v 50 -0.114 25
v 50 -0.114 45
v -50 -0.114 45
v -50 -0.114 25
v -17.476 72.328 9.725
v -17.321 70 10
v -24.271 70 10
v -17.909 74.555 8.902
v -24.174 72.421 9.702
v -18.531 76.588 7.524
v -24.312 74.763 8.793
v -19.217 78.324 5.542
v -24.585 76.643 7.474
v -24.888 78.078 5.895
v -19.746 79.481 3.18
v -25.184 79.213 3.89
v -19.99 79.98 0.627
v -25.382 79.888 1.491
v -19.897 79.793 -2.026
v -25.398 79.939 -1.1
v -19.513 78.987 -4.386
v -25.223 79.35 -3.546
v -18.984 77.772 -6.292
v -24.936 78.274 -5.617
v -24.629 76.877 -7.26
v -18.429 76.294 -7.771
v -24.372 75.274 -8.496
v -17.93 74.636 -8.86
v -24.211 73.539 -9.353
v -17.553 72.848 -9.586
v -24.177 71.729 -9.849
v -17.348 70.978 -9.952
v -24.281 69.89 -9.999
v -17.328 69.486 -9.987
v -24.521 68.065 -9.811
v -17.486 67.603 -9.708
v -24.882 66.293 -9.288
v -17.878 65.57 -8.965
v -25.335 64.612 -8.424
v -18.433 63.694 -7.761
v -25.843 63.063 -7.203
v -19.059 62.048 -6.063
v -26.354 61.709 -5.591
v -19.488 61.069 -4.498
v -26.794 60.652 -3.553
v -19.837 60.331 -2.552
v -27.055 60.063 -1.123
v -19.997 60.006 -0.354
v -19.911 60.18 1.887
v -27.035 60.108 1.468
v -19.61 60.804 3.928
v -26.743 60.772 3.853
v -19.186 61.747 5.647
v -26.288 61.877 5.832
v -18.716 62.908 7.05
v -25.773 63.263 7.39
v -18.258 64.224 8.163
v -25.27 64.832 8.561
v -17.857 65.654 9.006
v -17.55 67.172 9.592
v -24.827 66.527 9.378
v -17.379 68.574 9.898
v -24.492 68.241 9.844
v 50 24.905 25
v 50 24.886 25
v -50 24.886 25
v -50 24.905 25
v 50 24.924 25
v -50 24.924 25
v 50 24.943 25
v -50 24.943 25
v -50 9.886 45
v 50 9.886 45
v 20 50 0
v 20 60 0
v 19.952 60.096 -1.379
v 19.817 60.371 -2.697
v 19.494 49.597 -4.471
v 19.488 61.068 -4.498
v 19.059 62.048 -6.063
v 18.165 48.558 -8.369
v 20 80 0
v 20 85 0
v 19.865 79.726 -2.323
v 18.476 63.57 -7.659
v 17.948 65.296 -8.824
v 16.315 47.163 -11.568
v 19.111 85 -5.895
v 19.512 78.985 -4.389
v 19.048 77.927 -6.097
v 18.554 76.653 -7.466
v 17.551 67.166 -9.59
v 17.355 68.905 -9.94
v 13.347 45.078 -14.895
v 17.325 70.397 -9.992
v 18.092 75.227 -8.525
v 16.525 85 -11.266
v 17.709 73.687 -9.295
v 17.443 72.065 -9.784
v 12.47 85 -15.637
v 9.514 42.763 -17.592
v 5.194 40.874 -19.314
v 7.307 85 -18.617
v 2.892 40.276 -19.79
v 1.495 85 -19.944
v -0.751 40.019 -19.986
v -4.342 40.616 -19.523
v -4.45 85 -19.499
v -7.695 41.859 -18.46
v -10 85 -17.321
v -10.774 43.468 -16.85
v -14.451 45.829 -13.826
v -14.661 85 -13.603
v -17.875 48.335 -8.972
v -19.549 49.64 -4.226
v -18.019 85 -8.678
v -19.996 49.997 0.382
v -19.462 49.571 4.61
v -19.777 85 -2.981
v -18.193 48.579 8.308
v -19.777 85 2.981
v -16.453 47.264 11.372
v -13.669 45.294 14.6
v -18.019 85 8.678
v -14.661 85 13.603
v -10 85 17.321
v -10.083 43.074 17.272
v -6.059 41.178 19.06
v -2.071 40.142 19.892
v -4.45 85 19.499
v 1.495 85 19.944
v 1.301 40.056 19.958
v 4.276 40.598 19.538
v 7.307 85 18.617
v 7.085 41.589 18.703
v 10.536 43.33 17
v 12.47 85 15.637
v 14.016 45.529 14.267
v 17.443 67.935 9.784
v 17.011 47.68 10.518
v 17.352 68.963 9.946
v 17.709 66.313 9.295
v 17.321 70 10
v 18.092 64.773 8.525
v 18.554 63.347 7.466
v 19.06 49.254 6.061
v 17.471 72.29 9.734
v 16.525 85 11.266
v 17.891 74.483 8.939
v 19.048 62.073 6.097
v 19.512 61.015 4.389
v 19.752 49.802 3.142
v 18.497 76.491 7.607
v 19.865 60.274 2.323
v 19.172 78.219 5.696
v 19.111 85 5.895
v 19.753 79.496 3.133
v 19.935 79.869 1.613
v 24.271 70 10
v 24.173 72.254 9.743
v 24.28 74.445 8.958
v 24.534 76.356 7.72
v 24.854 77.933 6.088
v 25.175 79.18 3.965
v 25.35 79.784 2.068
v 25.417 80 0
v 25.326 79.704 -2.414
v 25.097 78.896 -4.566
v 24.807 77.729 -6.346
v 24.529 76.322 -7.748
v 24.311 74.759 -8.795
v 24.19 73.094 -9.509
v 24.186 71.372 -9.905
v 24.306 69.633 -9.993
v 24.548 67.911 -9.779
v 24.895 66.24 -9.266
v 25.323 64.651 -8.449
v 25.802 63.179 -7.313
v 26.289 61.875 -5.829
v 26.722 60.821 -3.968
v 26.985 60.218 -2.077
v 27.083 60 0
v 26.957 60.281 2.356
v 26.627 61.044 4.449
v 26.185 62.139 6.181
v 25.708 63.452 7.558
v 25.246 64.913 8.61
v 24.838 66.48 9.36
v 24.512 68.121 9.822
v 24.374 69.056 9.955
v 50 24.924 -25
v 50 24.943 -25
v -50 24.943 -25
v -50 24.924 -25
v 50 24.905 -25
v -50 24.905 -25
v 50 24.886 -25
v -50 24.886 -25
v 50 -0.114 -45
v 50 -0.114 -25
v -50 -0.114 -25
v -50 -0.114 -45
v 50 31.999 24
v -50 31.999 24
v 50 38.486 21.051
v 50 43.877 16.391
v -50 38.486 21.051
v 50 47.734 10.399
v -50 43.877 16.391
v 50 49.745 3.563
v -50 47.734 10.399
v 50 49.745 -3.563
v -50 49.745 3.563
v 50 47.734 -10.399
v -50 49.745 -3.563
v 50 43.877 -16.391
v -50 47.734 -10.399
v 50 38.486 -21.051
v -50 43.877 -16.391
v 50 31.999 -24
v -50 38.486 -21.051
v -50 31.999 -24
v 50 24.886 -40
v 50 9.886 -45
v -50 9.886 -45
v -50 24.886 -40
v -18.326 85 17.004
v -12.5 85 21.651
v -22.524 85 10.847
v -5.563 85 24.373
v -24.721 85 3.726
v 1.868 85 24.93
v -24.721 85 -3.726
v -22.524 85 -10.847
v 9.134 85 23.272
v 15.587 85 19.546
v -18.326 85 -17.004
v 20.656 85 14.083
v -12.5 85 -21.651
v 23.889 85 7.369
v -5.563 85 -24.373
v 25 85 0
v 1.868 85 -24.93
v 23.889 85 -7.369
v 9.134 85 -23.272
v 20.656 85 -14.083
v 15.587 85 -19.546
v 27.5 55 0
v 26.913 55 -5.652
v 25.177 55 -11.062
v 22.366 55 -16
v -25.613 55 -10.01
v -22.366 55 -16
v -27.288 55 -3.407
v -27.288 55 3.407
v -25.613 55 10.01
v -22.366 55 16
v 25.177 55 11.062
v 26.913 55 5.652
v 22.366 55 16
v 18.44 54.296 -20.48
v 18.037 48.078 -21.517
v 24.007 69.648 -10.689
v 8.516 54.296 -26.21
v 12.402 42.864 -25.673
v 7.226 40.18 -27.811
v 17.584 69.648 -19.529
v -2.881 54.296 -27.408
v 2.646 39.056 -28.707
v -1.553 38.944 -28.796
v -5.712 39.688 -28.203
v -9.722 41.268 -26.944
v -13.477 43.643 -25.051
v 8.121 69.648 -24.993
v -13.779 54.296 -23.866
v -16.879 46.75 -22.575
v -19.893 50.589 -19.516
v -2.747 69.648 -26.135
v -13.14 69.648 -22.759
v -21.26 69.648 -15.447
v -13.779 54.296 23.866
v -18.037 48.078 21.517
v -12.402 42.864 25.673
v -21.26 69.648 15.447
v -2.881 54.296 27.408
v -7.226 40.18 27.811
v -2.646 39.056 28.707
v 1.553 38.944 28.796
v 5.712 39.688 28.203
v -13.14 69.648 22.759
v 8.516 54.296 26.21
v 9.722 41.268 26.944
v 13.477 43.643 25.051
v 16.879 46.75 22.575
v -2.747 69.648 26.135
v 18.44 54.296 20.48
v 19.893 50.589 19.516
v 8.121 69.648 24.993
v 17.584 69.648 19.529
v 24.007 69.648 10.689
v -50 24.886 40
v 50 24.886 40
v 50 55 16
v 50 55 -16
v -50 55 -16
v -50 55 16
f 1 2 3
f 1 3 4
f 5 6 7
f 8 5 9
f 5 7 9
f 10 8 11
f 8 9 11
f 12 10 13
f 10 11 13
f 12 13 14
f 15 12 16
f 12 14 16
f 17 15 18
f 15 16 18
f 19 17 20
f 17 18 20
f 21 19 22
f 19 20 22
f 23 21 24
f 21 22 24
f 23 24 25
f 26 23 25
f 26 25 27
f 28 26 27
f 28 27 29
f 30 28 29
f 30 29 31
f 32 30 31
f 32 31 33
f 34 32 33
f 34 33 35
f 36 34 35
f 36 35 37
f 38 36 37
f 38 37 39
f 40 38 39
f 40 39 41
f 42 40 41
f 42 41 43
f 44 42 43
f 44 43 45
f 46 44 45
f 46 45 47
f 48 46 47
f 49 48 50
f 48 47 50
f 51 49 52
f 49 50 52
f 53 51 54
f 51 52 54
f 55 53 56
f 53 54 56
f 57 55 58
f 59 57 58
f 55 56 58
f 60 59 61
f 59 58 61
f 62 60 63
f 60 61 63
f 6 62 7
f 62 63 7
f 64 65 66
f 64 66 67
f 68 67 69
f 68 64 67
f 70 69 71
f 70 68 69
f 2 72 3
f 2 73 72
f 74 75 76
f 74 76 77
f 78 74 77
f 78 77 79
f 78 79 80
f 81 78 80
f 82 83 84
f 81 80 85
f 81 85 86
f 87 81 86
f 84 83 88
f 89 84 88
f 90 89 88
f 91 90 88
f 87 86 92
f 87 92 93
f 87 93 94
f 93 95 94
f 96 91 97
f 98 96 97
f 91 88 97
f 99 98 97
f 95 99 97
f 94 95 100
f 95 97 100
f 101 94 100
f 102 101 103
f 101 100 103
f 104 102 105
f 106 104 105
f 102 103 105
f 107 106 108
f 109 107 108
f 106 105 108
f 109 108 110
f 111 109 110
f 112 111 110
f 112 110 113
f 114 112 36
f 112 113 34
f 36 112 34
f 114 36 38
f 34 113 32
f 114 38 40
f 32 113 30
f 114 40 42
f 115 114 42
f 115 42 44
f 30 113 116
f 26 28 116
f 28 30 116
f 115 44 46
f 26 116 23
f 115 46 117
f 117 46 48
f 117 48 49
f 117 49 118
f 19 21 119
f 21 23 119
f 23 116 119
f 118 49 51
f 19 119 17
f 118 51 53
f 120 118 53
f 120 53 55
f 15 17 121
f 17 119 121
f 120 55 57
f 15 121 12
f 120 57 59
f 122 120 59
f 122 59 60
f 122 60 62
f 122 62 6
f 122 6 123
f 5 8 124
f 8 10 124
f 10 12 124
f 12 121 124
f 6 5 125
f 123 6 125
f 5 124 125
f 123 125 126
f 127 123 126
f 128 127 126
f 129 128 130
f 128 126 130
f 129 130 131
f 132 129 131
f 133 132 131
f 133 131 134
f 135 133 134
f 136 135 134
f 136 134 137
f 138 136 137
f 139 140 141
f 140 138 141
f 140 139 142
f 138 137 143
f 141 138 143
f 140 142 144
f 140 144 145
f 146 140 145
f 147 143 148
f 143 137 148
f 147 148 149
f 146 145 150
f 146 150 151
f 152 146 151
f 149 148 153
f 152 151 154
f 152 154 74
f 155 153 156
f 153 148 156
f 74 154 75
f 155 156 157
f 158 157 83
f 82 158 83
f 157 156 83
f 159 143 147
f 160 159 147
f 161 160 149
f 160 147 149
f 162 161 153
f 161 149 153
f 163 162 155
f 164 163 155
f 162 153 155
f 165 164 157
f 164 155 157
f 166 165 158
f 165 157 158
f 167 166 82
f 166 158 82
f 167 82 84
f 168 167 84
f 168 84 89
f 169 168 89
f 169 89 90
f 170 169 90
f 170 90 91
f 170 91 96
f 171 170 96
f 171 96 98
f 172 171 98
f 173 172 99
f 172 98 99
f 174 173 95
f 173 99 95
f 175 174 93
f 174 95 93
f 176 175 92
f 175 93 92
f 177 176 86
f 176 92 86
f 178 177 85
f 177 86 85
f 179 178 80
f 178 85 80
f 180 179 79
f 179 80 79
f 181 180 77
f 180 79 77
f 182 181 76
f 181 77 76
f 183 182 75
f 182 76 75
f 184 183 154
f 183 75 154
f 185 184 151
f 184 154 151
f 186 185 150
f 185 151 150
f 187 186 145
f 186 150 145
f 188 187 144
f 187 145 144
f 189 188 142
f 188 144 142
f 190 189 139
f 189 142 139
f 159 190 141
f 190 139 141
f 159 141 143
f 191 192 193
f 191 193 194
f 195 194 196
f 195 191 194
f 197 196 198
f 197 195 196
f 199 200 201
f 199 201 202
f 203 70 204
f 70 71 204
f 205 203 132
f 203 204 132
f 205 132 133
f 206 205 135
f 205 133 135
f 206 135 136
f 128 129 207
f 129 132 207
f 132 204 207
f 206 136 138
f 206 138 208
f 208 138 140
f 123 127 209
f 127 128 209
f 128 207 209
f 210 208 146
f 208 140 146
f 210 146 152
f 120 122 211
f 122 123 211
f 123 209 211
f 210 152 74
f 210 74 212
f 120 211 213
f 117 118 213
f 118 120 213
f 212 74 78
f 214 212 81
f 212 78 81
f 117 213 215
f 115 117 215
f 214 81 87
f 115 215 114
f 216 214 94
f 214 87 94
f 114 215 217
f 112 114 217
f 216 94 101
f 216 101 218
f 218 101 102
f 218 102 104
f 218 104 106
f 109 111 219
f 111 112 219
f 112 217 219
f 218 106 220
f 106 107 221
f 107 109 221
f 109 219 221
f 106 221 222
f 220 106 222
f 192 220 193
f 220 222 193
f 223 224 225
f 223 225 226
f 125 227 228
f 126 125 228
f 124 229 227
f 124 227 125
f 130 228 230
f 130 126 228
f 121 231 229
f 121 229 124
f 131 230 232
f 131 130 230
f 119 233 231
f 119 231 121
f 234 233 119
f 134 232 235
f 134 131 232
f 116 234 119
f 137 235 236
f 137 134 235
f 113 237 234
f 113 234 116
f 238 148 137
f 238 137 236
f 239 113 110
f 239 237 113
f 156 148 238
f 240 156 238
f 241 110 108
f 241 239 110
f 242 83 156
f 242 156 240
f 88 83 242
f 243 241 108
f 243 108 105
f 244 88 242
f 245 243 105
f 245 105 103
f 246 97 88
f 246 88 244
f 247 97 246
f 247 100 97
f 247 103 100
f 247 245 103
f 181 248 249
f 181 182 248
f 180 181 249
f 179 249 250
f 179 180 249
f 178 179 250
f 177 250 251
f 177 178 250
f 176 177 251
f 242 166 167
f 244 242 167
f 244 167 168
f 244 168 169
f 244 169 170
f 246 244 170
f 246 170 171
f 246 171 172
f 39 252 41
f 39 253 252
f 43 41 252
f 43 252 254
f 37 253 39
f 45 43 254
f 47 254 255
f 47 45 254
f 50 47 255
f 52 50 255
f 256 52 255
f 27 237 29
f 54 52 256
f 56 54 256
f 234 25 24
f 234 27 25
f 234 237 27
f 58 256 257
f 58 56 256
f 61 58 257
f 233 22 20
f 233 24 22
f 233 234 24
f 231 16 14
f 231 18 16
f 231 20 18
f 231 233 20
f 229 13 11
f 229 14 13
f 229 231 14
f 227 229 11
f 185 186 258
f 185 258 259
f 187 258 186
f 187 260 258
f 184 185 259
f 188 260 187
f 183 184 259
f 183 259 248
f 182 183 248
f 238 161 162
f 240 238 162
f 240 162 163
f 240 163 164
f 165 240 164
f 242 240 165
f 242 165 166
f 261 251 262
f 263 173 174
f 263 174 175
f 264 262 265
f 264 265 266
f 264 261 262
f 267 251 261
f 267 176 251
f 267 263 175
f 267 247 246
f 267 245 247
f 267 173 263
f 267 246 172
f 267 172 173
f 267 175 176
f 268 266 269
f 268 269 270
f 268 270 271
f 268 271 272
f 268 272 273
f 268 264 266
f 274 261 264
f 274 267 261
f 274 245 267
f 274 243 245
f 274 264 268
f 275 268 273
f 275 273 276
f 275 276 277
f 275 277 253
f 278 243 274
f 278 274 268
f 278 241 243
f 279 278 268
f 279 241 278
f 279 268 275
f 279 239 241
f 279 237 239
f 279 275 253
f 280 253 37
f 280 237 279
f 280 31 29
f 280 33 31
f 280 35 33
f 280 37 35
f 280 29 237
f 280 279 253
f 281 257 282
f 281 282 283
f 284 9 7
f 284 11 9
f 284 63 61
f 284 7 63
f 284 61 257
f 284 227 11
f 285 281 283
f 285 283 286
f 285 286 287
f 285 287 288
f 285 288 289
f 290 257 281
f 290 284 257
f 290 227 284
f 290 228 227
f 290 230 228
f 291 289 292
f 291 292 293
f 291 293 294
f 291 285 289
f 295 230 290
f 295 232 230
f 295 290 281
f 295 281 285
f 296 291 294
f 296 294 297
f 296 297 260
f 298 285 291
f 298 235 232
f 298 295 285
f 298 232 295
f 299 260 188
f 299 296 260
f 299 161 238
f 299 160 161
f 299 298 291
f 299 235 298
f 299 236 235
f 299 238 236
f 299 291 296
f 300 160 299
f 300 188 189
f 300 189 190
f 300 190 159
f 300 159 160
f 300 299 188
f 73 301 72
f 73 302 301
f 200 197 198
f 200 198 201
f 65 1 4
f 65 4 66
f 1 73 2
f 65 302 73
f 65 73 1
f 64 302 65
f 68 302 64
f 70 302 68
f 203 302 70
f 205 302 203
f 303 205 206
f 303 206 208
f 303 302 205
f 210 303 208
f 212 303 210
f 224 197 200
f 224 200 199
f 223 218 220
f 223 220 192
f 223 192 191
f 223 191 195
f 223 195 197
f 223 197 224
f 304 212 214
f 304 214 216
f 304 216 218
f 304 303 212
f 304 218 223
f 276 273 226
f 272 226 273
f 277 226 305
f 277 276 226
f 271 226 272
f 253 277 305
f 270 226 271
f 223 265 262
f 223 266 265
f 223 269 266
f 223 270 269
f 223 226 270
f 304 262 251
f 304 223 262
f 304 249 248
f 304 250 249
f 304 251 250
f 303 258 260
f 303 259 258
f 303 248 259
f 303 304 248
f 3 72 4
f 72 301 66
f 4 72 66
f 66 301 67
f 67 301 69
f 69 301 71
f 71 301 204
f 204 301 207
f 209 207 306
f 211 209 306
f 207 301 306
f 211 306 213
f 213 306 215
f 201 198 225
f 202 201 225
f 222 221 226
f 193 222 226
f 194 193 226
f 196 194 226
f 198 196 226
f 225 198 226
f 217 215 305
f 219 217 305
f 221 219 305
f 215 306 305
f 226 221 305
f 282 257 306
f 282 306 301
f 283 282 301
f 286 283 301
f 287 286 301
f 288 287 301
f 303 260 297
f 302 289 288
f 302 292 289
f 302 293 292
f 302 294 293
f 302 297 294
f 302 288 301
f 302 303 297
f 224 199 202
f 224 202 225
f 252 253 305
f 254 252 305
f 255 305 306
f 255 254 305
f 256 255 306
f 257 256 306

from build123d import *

# Parameters (mm, degrees)
EXTRUDE_1_DEPTH      = 50
EXTRUDE_1_DEPTH_BACK = 50
SKETCH_3_R           = 30
SKETCH_5_R           = 25
SKETCH_6_R           = 25
SKETCH_6_R_2         = 10
CUT_EXTRUDE_1_DEPTH  = 100
SKETCH_7_R           = 20
CUT_EXTRUDE_2_DEPTH  = 100


with BuildPart() as part:
    # Эскиз1 → Бобышка-Вытянуть1 (new body, two sides)
    with BuildSketch(Plane(origin=(0, 0, 0), x_dir=(0, 0, -1), z_dir=(1, 0, 0))) as extrude_1_sk:
        with BuildLine():
            Line((-45, 9.886444909), (-45, -0.113555091))
            Line((-45, -0.113555091), (-25, -0.113555091))
            Line((-25, -0.113555091), (-25, 24.886444909))
            ThreePointArc((-25, 24.886444909), (0, 49.886444909), (25, 24.886444909))
            Line((25, 24.886444909), (25, -0.113555091))
            Line((25, -0.113555091), (45, -0.113555091))
            Line((45, -0.113555091), (45, 9.886444909))
            Line((45, 9.886444909), (40, 24.886444909))
            Line((40, 24.886444909), (16, 55))
            Line((16, 55), (-16, 55))
            Line((-16, 55), (-40, 24.886444909))
            Line((-40, 24.886444909), (-45, 9.886444909))
        make_face()
    extrude(amount=EXTRUDE_1_DEPTH)
    extrude(extrude_1_sk.sketch, amount=-EXTRUDE_1_DEPTH_BACK)

    # Эскиз3 → По сечениям1 section 0
    with BuildSketch(Plane(origin=(0, 25, 0), x_dir=(1, 0, 0), z_dir=(0, 1, 0))):
        Circle(SKETCH_3_R)
    # Эскиз5 → По сечениям1 section 1
    with BuildSketch(Plane(origin=(0, 85, 0), x_dir=(1, 0, 0), z_dir=(0, 1, 0))):
        Circle(SKETCH_5_R)
    loft()

    # Эскиз6 → Вырез-Вытянуть1 (cut)
    with BuildSketch(Plane.ZY.offset(50)):
        with Locations((0, 25)):
            Circle(SKETCH_6_R)
        with Locations((0, 70)):
            Circle(SKETCH_6_R_2)
    extrude(amount=-CUT_EXTRUDE_1_DEPTH, mode=Mode.SUBTRACT)

    # Эскиз7 → Вырез-Вытянуть2 (cut)
    with BuildSketch(Plane(origin=(0, 85, 0), x_dir=(1, 0, 0), z_dir=(0, 1, 0))):
        Circle(SKETCH_7_R)
    extrude(amount=-CUT_EXTRUDE_2_DEPTH, mode=Mode.SUBTRACT)


solid = part.part
